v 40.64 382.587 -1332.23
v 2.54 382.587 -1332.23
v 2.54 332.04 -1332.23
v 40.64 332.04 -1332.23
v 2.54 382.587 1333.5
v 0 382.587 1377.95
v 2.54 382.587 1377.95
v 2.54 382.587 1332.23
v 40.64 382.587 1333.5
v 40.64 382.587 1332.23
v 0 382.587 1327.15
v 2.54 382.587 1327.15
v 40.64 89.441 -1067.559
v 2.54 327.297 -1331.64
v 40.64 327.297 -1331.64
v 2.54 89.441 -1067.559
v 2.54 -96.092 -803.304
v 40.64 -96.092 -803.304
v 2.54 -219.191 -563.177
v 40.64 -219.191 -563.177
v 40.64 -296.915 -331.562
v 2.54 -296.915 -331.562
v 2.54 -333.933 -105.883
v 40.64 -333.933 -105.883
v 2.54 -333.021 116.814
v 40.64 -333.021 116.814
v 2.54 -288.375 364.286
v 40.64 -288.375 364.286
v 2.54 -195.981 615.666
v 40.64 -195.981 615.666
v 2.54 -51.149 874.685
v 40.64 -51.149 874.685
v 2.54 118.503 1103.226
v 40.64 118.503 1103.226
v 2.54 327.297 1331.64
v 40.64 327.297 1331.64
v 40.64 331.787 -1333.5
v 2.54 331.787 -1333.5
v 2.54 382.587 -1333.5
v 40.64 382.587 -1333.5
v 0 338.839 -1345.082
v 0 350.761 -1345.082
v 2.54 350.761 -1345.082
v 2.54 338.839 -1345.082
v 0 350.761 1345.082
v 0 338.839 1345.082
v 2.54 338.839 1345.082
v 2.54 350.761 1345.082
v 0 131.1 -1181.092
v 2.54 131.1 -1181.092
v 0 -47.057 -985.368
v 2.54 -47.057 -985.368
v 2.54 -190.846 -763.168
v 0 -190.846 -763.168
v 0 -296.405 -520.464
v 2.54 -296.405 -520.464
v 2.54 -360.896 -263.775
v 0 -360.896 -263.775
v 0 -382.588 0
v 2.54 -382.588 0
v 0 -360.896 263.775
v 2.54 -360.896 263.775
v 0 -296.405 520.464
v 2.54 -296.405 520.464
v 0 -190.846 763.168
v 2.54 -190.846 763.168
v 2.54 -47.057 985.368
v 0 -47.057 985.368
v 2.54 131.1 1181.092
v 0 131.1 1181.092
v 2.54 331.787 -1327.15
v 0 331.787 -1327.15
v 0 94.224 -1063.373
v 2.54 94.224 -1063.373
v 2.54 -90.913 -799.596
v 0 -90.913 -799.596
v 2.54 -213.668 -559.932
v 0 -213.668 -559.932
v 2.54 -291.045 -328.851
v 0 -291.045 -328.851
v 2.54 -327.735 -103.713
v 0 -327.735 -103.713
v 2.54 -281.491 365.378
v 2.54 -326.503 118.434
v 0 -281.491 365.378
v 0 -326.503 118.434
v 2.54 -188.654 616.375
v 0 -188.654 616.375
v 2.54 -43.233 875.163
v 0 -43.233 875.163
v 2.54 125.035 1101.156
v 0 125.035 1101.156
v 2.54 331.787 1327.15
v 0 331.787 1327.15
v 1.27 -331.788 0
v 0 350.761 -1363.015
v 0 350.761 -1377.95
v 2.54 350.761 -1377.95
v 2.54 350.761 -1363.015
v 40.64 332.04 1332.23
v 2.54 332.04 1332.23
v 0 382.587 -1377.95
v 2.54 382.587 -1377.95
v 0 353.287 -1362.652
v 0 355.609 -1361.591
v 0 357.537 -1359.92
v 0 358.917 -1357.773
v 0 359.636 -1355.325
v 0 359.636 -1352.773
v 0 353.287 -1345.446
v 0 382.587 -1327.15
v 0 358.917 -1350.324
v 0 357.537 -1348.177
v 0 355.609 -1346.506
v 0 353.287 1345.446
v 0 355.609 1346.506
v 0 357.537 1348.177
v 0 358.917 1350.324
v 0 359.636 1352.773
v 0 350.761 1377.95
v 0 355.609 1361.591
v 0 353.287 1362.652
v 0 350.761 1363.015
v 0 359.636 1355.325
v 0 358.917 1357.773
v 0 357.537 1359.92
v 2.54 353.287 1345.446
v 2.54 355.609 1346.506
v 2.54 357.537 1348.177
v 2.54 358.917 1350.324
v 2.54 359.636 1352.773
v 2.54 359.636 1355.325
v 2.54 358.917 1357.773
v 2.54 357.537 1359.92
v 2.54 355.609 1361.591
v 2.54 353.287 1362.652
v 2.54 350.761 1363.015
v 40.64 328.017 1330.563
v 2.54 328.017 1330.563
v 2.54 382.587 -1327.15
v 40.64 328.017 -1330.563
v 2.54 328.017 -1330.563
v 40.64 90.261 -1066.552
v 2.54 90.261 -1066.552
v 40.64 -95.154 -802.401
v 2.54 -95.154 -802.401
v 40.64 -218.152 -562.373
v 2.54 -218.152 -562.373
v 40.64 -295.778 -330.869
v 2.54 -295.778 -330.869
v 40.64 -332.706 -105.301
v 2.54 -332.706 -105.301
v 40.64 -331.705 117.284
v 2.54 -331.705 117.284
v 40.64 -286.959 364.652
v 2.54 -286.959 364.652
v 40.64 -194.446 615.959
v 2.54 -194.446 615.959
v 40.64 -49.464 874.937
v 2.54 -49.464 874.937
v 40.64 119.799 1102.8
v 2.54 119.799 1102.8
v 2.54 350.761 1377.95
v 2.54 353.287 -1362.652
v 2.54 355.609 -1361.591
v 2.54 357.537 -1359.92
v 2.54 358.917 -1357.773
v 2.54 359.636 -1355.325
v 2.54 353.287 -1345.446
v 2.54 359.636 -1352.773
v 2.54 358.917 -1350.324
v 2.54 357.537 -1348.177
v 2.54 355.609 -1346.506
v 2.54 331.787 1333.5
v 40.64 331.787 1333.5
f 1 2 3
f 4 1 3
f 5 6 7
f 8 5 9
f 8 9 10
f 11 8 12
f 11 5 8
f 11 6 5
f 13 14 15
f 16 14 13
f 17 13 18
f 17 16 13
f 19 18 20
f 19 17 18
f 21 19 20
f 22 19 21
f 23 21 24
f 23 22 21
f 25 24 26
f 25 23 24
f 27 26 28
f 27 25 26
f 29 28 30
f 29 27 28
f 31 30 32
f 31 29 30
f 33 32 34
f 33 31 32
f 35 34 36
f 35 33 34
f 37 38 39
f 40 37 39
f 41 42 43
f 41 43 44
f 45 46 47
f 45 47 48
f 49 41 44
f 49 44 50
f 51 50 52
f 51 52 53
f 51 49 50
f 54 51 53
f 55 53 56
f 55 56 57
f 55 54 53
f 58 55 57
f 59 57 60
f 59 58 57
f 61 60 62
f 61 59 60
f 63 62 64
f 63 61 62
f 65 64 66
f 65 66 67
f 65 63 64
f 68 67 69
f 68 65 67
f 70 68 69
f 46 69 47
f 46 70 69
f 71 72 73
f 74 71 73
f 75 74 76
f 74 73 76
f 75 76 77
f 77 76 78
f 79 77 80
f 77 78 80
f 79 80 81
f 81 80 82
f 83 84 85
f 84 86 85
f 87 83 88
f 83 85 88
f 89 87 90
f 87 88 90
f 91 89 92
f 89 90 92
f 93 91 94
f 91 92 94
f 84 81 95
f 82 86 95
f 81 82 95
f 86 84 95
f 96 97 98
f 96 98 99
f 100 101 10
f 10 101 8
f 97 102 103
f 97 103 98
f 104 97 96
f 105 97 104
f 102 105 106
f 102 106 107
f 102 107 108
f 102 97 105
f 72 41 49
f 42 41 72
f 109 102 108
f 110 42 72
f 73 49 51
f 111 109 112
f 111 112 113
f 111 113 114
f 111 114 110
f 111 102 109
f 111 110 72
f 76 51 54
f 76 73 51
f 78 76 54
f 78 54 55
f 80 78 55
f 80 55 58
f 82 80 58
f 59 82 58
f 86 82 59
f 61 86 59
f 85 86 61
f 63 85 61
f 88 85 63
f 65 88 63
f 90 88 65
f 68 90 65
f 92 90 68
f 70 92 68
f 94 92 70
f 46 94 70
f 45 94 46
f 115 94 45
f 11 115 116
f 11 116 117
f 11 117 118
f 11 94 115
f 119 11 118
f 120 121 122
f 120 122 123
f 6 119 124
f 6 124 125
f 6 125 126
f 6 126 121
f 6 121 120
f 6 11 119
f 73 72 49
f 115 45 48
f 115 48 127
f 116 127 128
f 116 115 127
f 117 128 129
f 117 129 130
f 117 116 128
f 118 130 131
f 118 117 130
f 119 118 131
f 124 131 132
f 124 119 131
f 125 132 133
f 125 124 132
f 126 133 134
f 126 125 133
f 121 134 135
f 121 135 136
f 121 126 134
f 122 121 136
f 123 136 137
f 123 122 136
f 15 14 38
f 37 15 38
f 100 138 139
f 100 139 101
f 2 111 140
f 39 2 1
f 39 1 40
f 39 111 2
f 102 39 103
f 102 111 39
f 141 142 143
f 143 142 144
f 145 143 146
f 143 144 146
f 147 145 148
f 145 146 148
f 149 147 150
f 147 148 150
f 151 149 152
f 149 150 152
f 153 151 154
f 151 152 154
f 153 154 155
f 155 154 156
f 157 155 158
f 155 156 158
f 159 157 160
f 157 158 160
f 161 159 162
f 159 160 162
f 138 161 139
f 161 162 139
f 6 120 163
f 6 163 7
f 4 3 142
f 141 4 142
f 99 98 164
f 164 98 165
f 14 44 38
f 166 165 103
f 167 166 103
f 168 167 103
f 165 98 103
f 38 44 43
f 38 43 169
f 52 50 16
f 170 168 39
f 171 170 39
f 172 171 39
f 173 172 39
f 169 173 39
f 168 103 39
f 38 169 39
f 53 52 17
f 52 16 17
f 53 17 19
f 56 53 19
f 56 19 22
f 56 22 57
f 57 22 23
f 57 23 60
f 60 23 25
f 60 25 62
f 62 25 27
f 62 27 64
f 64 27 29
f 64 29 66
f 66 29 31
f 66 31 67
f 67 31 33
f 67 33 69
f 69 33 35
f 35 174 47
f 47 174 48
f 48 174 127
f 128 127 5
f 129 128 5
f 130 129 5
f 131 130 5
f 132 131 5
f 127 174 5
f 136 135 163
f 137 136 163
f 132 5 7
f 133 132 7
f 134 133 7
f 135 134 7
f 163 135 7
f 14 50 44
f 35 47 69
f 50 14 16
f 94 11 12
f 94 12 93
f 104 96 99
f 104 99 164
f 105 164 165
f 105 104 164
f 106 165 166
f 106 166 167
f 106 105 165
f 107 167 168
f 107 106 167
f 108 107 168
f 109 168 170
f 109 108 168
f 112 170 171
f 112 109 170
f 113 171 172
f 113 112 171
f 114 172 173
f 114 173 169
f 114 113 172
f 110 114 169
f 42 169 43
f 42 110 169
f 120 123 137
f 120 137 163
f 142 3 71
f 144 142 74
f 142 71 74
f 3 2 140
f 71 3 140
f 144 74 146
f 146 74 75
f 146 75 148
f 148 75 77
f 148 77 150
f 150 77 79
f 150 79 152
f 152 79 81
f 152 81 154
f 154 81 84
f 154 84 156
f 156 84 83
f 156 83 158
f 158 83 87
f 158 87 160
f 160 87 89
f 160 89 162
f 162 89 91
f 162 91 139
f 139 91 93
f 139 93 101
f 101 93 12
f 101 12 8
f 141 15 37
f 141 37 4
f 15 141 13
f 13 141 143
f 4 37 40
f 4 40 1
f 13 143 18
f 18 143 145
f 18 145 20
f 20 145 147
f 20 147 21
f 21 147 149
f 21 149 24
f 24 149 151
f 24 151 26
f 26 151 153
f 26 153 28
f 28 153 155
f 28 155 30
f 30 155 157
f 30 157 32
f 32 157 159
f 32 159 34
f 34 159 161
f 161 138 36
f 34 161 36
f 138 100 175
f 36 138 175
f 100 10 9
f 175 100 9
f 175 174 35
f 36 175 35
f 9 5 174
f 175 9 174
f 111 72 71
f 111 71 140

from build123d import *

# Parameters (mm, degrees)
BOSS_EXTRUDE1_DEPTH = 2.54
EXTRUDE_THIN1_DEPTH = 38.1


# Read off the part's stored shape, not the designer's step: Extrude-Thin1
with BuildPart() as part:
    # Sketch60 → Boss-Extrude1 (new body)
    with BuildSketch(Plane(origin=(0, 0, 0), x_dir=(0, 0, -1), z_dir=(1, 0, 0))):
        with BuildLine():
            Line((1327.15, 331.787470833), (1327.15, 382.587350833))
            Line((1327.15, 382.587350833), (1377.950002406, 382.587350833))
            Line((1377.950002406, 382.587350833), (1377.950002406, 350.761150833))
            Line((1377.950002406, 350.761150833), (1363.014798129, 350.761150833))
            ThreePointArc((1363.014798129, 350.761150833), (1354.048599065, 359.727349897), (1345.0824, 350.761150833))
            Line((1345.0824, 350.761150833), (1345.0824, 338.838562796))
            ThreePointArc((1345.0824, 338.838562796), (0, -382.587529167), (-1345.0824, 338.838562795))
            Line((-1345.0824, 338.838562795), (-1345.0824, 350.761150833))
            ThreePointArc((-1345.0824, 350.761150833), (-1354.048599065, 359.727349897), (-1363.014798129, 350.761150833))
            Line((-1363.014798129, 350.761150833), (-1377.950002406, 350.761150833))
            Line((-1377.950002406, 350.761150833), (-1377.950002406, 382.587350833))
            Line((-1377.950002406, 382.587350833), (-1327.15, 382.587350833))
            Line((-1327.15, 382.587350833), (-1327.15, 331.787470833))
            add(Edge.make_bspline(
                [(1327.15, 331.787470833), (1e-09, -995.362529167), (-1327.15, 331.787470833)],
                knots=[0, 0, 0, 1, 1, 1], degree=2))
        make_face()
    extrude(amount=BOSS_EXTRUDE1_DEPTH)

    # Extrude-Thin1 outline → Extrude-Thin1 (add)
    with BuildSketch(Plane(origin=(2.54, 0, 0), x_dir=(0, 0, -1), z_dir=(1, 0, 0))):
        with BuildLine():
            add(Edge.make_bspline(
                [(1331.64012806, 327.297342772), (1220.857206072, 216.514420784), (1110.039266695, 119.543483359), (888.305733392, -46.756666627), (777.389280582, -116.086154697), (555.440332256, -227.060628875), (444.406603679, -268.704745917), (222.248599022, -324.244247103), (111.125000161, -338.137529152), (-111.124999809, -338.137529182), (-222.24859867, -324.244247162), (-444.406603328, -268.704746034), (-555.440331905, -227.060629021), (-777.389280231, -116.086154902), (-888.305733041, -46.756666861), (-1110.039266345, 119.543483066), (-1220.857205722, 216.514420463), (-1331.64012771, 327.297342421)],
                knots=[0, 0, 0, 0, 0.125, 0.125, 0.25, 0.25, 0.375, 0.375, 0.5, 0.5, 0.625, 0.625, 0.75, 0.75, 0.875, 0.875, 1, 1, 1, 1], degree=3))
            Line((1331.64012806, 327.297342772), (1333.5, 331.787470833))
            Line((1333.5, 331.787470833), (1333.5, 382.587350833))
            Line((1333.5, 382.587350833), (1332.23, 382.587350833))
            Line((1332.23, 382.587350833), (1332.23, 332.04008954))
            Line((1332.23, 332.04008954), (1330.563482535, 328.016760475))
            add(Edge.make_bspline(
                [(1330.563482535, 328.016760475), (1219.832830837, 217.300990844), (1109.074174075, 120.39600204), (887.478733858, -45.778240912), (776.641272659, -115.047704785), (554.873550579, -225.916661245), (443.942272952, -267.515471252), (222.0073883, -322.991733554), (111.004224806, -336.867529153), (-111.004224472, -336.867529181), (-222.007387967, -322.991733609), (-443.942272618, -267.515471364), (-554.873550246, -225.916661384), (-776.641272326, -115.047704979), (-887.478733526, -45.778241134), (-1109.074173743, 120.396001763), (-1219.832830505, 217.300990539), (-1330.563482203, 328.016760142)],
                knots=[0, 0, 0, 0, 0.125, 0.125, 0.25, 0.25, 0.375, 0.375, 0.5, 0.5, 0.625, 0.625, 0.75, 0.75, 0.875, 0.875, 1, 1, 1, 1], degree=3))
            Line((-1330.563482203, 328.016760142), (-1332.23, 332.040089565))
            Line((-1332.23, 332.040089565), (-1332.23, 382.587350833))
            Line((-1332.23, 382.587350833), (-1333.5, 382.587350833))
            Line((-1333.5, 382.587350833), (-1333.5, 331.787470833))
            Line((-1333.5, 331.787470833), (-1331.64012771, 327.297342421))
        make_face()
    extrude(amount=EXTRUDE_THIN1_DEPTH)


solid = part.part
